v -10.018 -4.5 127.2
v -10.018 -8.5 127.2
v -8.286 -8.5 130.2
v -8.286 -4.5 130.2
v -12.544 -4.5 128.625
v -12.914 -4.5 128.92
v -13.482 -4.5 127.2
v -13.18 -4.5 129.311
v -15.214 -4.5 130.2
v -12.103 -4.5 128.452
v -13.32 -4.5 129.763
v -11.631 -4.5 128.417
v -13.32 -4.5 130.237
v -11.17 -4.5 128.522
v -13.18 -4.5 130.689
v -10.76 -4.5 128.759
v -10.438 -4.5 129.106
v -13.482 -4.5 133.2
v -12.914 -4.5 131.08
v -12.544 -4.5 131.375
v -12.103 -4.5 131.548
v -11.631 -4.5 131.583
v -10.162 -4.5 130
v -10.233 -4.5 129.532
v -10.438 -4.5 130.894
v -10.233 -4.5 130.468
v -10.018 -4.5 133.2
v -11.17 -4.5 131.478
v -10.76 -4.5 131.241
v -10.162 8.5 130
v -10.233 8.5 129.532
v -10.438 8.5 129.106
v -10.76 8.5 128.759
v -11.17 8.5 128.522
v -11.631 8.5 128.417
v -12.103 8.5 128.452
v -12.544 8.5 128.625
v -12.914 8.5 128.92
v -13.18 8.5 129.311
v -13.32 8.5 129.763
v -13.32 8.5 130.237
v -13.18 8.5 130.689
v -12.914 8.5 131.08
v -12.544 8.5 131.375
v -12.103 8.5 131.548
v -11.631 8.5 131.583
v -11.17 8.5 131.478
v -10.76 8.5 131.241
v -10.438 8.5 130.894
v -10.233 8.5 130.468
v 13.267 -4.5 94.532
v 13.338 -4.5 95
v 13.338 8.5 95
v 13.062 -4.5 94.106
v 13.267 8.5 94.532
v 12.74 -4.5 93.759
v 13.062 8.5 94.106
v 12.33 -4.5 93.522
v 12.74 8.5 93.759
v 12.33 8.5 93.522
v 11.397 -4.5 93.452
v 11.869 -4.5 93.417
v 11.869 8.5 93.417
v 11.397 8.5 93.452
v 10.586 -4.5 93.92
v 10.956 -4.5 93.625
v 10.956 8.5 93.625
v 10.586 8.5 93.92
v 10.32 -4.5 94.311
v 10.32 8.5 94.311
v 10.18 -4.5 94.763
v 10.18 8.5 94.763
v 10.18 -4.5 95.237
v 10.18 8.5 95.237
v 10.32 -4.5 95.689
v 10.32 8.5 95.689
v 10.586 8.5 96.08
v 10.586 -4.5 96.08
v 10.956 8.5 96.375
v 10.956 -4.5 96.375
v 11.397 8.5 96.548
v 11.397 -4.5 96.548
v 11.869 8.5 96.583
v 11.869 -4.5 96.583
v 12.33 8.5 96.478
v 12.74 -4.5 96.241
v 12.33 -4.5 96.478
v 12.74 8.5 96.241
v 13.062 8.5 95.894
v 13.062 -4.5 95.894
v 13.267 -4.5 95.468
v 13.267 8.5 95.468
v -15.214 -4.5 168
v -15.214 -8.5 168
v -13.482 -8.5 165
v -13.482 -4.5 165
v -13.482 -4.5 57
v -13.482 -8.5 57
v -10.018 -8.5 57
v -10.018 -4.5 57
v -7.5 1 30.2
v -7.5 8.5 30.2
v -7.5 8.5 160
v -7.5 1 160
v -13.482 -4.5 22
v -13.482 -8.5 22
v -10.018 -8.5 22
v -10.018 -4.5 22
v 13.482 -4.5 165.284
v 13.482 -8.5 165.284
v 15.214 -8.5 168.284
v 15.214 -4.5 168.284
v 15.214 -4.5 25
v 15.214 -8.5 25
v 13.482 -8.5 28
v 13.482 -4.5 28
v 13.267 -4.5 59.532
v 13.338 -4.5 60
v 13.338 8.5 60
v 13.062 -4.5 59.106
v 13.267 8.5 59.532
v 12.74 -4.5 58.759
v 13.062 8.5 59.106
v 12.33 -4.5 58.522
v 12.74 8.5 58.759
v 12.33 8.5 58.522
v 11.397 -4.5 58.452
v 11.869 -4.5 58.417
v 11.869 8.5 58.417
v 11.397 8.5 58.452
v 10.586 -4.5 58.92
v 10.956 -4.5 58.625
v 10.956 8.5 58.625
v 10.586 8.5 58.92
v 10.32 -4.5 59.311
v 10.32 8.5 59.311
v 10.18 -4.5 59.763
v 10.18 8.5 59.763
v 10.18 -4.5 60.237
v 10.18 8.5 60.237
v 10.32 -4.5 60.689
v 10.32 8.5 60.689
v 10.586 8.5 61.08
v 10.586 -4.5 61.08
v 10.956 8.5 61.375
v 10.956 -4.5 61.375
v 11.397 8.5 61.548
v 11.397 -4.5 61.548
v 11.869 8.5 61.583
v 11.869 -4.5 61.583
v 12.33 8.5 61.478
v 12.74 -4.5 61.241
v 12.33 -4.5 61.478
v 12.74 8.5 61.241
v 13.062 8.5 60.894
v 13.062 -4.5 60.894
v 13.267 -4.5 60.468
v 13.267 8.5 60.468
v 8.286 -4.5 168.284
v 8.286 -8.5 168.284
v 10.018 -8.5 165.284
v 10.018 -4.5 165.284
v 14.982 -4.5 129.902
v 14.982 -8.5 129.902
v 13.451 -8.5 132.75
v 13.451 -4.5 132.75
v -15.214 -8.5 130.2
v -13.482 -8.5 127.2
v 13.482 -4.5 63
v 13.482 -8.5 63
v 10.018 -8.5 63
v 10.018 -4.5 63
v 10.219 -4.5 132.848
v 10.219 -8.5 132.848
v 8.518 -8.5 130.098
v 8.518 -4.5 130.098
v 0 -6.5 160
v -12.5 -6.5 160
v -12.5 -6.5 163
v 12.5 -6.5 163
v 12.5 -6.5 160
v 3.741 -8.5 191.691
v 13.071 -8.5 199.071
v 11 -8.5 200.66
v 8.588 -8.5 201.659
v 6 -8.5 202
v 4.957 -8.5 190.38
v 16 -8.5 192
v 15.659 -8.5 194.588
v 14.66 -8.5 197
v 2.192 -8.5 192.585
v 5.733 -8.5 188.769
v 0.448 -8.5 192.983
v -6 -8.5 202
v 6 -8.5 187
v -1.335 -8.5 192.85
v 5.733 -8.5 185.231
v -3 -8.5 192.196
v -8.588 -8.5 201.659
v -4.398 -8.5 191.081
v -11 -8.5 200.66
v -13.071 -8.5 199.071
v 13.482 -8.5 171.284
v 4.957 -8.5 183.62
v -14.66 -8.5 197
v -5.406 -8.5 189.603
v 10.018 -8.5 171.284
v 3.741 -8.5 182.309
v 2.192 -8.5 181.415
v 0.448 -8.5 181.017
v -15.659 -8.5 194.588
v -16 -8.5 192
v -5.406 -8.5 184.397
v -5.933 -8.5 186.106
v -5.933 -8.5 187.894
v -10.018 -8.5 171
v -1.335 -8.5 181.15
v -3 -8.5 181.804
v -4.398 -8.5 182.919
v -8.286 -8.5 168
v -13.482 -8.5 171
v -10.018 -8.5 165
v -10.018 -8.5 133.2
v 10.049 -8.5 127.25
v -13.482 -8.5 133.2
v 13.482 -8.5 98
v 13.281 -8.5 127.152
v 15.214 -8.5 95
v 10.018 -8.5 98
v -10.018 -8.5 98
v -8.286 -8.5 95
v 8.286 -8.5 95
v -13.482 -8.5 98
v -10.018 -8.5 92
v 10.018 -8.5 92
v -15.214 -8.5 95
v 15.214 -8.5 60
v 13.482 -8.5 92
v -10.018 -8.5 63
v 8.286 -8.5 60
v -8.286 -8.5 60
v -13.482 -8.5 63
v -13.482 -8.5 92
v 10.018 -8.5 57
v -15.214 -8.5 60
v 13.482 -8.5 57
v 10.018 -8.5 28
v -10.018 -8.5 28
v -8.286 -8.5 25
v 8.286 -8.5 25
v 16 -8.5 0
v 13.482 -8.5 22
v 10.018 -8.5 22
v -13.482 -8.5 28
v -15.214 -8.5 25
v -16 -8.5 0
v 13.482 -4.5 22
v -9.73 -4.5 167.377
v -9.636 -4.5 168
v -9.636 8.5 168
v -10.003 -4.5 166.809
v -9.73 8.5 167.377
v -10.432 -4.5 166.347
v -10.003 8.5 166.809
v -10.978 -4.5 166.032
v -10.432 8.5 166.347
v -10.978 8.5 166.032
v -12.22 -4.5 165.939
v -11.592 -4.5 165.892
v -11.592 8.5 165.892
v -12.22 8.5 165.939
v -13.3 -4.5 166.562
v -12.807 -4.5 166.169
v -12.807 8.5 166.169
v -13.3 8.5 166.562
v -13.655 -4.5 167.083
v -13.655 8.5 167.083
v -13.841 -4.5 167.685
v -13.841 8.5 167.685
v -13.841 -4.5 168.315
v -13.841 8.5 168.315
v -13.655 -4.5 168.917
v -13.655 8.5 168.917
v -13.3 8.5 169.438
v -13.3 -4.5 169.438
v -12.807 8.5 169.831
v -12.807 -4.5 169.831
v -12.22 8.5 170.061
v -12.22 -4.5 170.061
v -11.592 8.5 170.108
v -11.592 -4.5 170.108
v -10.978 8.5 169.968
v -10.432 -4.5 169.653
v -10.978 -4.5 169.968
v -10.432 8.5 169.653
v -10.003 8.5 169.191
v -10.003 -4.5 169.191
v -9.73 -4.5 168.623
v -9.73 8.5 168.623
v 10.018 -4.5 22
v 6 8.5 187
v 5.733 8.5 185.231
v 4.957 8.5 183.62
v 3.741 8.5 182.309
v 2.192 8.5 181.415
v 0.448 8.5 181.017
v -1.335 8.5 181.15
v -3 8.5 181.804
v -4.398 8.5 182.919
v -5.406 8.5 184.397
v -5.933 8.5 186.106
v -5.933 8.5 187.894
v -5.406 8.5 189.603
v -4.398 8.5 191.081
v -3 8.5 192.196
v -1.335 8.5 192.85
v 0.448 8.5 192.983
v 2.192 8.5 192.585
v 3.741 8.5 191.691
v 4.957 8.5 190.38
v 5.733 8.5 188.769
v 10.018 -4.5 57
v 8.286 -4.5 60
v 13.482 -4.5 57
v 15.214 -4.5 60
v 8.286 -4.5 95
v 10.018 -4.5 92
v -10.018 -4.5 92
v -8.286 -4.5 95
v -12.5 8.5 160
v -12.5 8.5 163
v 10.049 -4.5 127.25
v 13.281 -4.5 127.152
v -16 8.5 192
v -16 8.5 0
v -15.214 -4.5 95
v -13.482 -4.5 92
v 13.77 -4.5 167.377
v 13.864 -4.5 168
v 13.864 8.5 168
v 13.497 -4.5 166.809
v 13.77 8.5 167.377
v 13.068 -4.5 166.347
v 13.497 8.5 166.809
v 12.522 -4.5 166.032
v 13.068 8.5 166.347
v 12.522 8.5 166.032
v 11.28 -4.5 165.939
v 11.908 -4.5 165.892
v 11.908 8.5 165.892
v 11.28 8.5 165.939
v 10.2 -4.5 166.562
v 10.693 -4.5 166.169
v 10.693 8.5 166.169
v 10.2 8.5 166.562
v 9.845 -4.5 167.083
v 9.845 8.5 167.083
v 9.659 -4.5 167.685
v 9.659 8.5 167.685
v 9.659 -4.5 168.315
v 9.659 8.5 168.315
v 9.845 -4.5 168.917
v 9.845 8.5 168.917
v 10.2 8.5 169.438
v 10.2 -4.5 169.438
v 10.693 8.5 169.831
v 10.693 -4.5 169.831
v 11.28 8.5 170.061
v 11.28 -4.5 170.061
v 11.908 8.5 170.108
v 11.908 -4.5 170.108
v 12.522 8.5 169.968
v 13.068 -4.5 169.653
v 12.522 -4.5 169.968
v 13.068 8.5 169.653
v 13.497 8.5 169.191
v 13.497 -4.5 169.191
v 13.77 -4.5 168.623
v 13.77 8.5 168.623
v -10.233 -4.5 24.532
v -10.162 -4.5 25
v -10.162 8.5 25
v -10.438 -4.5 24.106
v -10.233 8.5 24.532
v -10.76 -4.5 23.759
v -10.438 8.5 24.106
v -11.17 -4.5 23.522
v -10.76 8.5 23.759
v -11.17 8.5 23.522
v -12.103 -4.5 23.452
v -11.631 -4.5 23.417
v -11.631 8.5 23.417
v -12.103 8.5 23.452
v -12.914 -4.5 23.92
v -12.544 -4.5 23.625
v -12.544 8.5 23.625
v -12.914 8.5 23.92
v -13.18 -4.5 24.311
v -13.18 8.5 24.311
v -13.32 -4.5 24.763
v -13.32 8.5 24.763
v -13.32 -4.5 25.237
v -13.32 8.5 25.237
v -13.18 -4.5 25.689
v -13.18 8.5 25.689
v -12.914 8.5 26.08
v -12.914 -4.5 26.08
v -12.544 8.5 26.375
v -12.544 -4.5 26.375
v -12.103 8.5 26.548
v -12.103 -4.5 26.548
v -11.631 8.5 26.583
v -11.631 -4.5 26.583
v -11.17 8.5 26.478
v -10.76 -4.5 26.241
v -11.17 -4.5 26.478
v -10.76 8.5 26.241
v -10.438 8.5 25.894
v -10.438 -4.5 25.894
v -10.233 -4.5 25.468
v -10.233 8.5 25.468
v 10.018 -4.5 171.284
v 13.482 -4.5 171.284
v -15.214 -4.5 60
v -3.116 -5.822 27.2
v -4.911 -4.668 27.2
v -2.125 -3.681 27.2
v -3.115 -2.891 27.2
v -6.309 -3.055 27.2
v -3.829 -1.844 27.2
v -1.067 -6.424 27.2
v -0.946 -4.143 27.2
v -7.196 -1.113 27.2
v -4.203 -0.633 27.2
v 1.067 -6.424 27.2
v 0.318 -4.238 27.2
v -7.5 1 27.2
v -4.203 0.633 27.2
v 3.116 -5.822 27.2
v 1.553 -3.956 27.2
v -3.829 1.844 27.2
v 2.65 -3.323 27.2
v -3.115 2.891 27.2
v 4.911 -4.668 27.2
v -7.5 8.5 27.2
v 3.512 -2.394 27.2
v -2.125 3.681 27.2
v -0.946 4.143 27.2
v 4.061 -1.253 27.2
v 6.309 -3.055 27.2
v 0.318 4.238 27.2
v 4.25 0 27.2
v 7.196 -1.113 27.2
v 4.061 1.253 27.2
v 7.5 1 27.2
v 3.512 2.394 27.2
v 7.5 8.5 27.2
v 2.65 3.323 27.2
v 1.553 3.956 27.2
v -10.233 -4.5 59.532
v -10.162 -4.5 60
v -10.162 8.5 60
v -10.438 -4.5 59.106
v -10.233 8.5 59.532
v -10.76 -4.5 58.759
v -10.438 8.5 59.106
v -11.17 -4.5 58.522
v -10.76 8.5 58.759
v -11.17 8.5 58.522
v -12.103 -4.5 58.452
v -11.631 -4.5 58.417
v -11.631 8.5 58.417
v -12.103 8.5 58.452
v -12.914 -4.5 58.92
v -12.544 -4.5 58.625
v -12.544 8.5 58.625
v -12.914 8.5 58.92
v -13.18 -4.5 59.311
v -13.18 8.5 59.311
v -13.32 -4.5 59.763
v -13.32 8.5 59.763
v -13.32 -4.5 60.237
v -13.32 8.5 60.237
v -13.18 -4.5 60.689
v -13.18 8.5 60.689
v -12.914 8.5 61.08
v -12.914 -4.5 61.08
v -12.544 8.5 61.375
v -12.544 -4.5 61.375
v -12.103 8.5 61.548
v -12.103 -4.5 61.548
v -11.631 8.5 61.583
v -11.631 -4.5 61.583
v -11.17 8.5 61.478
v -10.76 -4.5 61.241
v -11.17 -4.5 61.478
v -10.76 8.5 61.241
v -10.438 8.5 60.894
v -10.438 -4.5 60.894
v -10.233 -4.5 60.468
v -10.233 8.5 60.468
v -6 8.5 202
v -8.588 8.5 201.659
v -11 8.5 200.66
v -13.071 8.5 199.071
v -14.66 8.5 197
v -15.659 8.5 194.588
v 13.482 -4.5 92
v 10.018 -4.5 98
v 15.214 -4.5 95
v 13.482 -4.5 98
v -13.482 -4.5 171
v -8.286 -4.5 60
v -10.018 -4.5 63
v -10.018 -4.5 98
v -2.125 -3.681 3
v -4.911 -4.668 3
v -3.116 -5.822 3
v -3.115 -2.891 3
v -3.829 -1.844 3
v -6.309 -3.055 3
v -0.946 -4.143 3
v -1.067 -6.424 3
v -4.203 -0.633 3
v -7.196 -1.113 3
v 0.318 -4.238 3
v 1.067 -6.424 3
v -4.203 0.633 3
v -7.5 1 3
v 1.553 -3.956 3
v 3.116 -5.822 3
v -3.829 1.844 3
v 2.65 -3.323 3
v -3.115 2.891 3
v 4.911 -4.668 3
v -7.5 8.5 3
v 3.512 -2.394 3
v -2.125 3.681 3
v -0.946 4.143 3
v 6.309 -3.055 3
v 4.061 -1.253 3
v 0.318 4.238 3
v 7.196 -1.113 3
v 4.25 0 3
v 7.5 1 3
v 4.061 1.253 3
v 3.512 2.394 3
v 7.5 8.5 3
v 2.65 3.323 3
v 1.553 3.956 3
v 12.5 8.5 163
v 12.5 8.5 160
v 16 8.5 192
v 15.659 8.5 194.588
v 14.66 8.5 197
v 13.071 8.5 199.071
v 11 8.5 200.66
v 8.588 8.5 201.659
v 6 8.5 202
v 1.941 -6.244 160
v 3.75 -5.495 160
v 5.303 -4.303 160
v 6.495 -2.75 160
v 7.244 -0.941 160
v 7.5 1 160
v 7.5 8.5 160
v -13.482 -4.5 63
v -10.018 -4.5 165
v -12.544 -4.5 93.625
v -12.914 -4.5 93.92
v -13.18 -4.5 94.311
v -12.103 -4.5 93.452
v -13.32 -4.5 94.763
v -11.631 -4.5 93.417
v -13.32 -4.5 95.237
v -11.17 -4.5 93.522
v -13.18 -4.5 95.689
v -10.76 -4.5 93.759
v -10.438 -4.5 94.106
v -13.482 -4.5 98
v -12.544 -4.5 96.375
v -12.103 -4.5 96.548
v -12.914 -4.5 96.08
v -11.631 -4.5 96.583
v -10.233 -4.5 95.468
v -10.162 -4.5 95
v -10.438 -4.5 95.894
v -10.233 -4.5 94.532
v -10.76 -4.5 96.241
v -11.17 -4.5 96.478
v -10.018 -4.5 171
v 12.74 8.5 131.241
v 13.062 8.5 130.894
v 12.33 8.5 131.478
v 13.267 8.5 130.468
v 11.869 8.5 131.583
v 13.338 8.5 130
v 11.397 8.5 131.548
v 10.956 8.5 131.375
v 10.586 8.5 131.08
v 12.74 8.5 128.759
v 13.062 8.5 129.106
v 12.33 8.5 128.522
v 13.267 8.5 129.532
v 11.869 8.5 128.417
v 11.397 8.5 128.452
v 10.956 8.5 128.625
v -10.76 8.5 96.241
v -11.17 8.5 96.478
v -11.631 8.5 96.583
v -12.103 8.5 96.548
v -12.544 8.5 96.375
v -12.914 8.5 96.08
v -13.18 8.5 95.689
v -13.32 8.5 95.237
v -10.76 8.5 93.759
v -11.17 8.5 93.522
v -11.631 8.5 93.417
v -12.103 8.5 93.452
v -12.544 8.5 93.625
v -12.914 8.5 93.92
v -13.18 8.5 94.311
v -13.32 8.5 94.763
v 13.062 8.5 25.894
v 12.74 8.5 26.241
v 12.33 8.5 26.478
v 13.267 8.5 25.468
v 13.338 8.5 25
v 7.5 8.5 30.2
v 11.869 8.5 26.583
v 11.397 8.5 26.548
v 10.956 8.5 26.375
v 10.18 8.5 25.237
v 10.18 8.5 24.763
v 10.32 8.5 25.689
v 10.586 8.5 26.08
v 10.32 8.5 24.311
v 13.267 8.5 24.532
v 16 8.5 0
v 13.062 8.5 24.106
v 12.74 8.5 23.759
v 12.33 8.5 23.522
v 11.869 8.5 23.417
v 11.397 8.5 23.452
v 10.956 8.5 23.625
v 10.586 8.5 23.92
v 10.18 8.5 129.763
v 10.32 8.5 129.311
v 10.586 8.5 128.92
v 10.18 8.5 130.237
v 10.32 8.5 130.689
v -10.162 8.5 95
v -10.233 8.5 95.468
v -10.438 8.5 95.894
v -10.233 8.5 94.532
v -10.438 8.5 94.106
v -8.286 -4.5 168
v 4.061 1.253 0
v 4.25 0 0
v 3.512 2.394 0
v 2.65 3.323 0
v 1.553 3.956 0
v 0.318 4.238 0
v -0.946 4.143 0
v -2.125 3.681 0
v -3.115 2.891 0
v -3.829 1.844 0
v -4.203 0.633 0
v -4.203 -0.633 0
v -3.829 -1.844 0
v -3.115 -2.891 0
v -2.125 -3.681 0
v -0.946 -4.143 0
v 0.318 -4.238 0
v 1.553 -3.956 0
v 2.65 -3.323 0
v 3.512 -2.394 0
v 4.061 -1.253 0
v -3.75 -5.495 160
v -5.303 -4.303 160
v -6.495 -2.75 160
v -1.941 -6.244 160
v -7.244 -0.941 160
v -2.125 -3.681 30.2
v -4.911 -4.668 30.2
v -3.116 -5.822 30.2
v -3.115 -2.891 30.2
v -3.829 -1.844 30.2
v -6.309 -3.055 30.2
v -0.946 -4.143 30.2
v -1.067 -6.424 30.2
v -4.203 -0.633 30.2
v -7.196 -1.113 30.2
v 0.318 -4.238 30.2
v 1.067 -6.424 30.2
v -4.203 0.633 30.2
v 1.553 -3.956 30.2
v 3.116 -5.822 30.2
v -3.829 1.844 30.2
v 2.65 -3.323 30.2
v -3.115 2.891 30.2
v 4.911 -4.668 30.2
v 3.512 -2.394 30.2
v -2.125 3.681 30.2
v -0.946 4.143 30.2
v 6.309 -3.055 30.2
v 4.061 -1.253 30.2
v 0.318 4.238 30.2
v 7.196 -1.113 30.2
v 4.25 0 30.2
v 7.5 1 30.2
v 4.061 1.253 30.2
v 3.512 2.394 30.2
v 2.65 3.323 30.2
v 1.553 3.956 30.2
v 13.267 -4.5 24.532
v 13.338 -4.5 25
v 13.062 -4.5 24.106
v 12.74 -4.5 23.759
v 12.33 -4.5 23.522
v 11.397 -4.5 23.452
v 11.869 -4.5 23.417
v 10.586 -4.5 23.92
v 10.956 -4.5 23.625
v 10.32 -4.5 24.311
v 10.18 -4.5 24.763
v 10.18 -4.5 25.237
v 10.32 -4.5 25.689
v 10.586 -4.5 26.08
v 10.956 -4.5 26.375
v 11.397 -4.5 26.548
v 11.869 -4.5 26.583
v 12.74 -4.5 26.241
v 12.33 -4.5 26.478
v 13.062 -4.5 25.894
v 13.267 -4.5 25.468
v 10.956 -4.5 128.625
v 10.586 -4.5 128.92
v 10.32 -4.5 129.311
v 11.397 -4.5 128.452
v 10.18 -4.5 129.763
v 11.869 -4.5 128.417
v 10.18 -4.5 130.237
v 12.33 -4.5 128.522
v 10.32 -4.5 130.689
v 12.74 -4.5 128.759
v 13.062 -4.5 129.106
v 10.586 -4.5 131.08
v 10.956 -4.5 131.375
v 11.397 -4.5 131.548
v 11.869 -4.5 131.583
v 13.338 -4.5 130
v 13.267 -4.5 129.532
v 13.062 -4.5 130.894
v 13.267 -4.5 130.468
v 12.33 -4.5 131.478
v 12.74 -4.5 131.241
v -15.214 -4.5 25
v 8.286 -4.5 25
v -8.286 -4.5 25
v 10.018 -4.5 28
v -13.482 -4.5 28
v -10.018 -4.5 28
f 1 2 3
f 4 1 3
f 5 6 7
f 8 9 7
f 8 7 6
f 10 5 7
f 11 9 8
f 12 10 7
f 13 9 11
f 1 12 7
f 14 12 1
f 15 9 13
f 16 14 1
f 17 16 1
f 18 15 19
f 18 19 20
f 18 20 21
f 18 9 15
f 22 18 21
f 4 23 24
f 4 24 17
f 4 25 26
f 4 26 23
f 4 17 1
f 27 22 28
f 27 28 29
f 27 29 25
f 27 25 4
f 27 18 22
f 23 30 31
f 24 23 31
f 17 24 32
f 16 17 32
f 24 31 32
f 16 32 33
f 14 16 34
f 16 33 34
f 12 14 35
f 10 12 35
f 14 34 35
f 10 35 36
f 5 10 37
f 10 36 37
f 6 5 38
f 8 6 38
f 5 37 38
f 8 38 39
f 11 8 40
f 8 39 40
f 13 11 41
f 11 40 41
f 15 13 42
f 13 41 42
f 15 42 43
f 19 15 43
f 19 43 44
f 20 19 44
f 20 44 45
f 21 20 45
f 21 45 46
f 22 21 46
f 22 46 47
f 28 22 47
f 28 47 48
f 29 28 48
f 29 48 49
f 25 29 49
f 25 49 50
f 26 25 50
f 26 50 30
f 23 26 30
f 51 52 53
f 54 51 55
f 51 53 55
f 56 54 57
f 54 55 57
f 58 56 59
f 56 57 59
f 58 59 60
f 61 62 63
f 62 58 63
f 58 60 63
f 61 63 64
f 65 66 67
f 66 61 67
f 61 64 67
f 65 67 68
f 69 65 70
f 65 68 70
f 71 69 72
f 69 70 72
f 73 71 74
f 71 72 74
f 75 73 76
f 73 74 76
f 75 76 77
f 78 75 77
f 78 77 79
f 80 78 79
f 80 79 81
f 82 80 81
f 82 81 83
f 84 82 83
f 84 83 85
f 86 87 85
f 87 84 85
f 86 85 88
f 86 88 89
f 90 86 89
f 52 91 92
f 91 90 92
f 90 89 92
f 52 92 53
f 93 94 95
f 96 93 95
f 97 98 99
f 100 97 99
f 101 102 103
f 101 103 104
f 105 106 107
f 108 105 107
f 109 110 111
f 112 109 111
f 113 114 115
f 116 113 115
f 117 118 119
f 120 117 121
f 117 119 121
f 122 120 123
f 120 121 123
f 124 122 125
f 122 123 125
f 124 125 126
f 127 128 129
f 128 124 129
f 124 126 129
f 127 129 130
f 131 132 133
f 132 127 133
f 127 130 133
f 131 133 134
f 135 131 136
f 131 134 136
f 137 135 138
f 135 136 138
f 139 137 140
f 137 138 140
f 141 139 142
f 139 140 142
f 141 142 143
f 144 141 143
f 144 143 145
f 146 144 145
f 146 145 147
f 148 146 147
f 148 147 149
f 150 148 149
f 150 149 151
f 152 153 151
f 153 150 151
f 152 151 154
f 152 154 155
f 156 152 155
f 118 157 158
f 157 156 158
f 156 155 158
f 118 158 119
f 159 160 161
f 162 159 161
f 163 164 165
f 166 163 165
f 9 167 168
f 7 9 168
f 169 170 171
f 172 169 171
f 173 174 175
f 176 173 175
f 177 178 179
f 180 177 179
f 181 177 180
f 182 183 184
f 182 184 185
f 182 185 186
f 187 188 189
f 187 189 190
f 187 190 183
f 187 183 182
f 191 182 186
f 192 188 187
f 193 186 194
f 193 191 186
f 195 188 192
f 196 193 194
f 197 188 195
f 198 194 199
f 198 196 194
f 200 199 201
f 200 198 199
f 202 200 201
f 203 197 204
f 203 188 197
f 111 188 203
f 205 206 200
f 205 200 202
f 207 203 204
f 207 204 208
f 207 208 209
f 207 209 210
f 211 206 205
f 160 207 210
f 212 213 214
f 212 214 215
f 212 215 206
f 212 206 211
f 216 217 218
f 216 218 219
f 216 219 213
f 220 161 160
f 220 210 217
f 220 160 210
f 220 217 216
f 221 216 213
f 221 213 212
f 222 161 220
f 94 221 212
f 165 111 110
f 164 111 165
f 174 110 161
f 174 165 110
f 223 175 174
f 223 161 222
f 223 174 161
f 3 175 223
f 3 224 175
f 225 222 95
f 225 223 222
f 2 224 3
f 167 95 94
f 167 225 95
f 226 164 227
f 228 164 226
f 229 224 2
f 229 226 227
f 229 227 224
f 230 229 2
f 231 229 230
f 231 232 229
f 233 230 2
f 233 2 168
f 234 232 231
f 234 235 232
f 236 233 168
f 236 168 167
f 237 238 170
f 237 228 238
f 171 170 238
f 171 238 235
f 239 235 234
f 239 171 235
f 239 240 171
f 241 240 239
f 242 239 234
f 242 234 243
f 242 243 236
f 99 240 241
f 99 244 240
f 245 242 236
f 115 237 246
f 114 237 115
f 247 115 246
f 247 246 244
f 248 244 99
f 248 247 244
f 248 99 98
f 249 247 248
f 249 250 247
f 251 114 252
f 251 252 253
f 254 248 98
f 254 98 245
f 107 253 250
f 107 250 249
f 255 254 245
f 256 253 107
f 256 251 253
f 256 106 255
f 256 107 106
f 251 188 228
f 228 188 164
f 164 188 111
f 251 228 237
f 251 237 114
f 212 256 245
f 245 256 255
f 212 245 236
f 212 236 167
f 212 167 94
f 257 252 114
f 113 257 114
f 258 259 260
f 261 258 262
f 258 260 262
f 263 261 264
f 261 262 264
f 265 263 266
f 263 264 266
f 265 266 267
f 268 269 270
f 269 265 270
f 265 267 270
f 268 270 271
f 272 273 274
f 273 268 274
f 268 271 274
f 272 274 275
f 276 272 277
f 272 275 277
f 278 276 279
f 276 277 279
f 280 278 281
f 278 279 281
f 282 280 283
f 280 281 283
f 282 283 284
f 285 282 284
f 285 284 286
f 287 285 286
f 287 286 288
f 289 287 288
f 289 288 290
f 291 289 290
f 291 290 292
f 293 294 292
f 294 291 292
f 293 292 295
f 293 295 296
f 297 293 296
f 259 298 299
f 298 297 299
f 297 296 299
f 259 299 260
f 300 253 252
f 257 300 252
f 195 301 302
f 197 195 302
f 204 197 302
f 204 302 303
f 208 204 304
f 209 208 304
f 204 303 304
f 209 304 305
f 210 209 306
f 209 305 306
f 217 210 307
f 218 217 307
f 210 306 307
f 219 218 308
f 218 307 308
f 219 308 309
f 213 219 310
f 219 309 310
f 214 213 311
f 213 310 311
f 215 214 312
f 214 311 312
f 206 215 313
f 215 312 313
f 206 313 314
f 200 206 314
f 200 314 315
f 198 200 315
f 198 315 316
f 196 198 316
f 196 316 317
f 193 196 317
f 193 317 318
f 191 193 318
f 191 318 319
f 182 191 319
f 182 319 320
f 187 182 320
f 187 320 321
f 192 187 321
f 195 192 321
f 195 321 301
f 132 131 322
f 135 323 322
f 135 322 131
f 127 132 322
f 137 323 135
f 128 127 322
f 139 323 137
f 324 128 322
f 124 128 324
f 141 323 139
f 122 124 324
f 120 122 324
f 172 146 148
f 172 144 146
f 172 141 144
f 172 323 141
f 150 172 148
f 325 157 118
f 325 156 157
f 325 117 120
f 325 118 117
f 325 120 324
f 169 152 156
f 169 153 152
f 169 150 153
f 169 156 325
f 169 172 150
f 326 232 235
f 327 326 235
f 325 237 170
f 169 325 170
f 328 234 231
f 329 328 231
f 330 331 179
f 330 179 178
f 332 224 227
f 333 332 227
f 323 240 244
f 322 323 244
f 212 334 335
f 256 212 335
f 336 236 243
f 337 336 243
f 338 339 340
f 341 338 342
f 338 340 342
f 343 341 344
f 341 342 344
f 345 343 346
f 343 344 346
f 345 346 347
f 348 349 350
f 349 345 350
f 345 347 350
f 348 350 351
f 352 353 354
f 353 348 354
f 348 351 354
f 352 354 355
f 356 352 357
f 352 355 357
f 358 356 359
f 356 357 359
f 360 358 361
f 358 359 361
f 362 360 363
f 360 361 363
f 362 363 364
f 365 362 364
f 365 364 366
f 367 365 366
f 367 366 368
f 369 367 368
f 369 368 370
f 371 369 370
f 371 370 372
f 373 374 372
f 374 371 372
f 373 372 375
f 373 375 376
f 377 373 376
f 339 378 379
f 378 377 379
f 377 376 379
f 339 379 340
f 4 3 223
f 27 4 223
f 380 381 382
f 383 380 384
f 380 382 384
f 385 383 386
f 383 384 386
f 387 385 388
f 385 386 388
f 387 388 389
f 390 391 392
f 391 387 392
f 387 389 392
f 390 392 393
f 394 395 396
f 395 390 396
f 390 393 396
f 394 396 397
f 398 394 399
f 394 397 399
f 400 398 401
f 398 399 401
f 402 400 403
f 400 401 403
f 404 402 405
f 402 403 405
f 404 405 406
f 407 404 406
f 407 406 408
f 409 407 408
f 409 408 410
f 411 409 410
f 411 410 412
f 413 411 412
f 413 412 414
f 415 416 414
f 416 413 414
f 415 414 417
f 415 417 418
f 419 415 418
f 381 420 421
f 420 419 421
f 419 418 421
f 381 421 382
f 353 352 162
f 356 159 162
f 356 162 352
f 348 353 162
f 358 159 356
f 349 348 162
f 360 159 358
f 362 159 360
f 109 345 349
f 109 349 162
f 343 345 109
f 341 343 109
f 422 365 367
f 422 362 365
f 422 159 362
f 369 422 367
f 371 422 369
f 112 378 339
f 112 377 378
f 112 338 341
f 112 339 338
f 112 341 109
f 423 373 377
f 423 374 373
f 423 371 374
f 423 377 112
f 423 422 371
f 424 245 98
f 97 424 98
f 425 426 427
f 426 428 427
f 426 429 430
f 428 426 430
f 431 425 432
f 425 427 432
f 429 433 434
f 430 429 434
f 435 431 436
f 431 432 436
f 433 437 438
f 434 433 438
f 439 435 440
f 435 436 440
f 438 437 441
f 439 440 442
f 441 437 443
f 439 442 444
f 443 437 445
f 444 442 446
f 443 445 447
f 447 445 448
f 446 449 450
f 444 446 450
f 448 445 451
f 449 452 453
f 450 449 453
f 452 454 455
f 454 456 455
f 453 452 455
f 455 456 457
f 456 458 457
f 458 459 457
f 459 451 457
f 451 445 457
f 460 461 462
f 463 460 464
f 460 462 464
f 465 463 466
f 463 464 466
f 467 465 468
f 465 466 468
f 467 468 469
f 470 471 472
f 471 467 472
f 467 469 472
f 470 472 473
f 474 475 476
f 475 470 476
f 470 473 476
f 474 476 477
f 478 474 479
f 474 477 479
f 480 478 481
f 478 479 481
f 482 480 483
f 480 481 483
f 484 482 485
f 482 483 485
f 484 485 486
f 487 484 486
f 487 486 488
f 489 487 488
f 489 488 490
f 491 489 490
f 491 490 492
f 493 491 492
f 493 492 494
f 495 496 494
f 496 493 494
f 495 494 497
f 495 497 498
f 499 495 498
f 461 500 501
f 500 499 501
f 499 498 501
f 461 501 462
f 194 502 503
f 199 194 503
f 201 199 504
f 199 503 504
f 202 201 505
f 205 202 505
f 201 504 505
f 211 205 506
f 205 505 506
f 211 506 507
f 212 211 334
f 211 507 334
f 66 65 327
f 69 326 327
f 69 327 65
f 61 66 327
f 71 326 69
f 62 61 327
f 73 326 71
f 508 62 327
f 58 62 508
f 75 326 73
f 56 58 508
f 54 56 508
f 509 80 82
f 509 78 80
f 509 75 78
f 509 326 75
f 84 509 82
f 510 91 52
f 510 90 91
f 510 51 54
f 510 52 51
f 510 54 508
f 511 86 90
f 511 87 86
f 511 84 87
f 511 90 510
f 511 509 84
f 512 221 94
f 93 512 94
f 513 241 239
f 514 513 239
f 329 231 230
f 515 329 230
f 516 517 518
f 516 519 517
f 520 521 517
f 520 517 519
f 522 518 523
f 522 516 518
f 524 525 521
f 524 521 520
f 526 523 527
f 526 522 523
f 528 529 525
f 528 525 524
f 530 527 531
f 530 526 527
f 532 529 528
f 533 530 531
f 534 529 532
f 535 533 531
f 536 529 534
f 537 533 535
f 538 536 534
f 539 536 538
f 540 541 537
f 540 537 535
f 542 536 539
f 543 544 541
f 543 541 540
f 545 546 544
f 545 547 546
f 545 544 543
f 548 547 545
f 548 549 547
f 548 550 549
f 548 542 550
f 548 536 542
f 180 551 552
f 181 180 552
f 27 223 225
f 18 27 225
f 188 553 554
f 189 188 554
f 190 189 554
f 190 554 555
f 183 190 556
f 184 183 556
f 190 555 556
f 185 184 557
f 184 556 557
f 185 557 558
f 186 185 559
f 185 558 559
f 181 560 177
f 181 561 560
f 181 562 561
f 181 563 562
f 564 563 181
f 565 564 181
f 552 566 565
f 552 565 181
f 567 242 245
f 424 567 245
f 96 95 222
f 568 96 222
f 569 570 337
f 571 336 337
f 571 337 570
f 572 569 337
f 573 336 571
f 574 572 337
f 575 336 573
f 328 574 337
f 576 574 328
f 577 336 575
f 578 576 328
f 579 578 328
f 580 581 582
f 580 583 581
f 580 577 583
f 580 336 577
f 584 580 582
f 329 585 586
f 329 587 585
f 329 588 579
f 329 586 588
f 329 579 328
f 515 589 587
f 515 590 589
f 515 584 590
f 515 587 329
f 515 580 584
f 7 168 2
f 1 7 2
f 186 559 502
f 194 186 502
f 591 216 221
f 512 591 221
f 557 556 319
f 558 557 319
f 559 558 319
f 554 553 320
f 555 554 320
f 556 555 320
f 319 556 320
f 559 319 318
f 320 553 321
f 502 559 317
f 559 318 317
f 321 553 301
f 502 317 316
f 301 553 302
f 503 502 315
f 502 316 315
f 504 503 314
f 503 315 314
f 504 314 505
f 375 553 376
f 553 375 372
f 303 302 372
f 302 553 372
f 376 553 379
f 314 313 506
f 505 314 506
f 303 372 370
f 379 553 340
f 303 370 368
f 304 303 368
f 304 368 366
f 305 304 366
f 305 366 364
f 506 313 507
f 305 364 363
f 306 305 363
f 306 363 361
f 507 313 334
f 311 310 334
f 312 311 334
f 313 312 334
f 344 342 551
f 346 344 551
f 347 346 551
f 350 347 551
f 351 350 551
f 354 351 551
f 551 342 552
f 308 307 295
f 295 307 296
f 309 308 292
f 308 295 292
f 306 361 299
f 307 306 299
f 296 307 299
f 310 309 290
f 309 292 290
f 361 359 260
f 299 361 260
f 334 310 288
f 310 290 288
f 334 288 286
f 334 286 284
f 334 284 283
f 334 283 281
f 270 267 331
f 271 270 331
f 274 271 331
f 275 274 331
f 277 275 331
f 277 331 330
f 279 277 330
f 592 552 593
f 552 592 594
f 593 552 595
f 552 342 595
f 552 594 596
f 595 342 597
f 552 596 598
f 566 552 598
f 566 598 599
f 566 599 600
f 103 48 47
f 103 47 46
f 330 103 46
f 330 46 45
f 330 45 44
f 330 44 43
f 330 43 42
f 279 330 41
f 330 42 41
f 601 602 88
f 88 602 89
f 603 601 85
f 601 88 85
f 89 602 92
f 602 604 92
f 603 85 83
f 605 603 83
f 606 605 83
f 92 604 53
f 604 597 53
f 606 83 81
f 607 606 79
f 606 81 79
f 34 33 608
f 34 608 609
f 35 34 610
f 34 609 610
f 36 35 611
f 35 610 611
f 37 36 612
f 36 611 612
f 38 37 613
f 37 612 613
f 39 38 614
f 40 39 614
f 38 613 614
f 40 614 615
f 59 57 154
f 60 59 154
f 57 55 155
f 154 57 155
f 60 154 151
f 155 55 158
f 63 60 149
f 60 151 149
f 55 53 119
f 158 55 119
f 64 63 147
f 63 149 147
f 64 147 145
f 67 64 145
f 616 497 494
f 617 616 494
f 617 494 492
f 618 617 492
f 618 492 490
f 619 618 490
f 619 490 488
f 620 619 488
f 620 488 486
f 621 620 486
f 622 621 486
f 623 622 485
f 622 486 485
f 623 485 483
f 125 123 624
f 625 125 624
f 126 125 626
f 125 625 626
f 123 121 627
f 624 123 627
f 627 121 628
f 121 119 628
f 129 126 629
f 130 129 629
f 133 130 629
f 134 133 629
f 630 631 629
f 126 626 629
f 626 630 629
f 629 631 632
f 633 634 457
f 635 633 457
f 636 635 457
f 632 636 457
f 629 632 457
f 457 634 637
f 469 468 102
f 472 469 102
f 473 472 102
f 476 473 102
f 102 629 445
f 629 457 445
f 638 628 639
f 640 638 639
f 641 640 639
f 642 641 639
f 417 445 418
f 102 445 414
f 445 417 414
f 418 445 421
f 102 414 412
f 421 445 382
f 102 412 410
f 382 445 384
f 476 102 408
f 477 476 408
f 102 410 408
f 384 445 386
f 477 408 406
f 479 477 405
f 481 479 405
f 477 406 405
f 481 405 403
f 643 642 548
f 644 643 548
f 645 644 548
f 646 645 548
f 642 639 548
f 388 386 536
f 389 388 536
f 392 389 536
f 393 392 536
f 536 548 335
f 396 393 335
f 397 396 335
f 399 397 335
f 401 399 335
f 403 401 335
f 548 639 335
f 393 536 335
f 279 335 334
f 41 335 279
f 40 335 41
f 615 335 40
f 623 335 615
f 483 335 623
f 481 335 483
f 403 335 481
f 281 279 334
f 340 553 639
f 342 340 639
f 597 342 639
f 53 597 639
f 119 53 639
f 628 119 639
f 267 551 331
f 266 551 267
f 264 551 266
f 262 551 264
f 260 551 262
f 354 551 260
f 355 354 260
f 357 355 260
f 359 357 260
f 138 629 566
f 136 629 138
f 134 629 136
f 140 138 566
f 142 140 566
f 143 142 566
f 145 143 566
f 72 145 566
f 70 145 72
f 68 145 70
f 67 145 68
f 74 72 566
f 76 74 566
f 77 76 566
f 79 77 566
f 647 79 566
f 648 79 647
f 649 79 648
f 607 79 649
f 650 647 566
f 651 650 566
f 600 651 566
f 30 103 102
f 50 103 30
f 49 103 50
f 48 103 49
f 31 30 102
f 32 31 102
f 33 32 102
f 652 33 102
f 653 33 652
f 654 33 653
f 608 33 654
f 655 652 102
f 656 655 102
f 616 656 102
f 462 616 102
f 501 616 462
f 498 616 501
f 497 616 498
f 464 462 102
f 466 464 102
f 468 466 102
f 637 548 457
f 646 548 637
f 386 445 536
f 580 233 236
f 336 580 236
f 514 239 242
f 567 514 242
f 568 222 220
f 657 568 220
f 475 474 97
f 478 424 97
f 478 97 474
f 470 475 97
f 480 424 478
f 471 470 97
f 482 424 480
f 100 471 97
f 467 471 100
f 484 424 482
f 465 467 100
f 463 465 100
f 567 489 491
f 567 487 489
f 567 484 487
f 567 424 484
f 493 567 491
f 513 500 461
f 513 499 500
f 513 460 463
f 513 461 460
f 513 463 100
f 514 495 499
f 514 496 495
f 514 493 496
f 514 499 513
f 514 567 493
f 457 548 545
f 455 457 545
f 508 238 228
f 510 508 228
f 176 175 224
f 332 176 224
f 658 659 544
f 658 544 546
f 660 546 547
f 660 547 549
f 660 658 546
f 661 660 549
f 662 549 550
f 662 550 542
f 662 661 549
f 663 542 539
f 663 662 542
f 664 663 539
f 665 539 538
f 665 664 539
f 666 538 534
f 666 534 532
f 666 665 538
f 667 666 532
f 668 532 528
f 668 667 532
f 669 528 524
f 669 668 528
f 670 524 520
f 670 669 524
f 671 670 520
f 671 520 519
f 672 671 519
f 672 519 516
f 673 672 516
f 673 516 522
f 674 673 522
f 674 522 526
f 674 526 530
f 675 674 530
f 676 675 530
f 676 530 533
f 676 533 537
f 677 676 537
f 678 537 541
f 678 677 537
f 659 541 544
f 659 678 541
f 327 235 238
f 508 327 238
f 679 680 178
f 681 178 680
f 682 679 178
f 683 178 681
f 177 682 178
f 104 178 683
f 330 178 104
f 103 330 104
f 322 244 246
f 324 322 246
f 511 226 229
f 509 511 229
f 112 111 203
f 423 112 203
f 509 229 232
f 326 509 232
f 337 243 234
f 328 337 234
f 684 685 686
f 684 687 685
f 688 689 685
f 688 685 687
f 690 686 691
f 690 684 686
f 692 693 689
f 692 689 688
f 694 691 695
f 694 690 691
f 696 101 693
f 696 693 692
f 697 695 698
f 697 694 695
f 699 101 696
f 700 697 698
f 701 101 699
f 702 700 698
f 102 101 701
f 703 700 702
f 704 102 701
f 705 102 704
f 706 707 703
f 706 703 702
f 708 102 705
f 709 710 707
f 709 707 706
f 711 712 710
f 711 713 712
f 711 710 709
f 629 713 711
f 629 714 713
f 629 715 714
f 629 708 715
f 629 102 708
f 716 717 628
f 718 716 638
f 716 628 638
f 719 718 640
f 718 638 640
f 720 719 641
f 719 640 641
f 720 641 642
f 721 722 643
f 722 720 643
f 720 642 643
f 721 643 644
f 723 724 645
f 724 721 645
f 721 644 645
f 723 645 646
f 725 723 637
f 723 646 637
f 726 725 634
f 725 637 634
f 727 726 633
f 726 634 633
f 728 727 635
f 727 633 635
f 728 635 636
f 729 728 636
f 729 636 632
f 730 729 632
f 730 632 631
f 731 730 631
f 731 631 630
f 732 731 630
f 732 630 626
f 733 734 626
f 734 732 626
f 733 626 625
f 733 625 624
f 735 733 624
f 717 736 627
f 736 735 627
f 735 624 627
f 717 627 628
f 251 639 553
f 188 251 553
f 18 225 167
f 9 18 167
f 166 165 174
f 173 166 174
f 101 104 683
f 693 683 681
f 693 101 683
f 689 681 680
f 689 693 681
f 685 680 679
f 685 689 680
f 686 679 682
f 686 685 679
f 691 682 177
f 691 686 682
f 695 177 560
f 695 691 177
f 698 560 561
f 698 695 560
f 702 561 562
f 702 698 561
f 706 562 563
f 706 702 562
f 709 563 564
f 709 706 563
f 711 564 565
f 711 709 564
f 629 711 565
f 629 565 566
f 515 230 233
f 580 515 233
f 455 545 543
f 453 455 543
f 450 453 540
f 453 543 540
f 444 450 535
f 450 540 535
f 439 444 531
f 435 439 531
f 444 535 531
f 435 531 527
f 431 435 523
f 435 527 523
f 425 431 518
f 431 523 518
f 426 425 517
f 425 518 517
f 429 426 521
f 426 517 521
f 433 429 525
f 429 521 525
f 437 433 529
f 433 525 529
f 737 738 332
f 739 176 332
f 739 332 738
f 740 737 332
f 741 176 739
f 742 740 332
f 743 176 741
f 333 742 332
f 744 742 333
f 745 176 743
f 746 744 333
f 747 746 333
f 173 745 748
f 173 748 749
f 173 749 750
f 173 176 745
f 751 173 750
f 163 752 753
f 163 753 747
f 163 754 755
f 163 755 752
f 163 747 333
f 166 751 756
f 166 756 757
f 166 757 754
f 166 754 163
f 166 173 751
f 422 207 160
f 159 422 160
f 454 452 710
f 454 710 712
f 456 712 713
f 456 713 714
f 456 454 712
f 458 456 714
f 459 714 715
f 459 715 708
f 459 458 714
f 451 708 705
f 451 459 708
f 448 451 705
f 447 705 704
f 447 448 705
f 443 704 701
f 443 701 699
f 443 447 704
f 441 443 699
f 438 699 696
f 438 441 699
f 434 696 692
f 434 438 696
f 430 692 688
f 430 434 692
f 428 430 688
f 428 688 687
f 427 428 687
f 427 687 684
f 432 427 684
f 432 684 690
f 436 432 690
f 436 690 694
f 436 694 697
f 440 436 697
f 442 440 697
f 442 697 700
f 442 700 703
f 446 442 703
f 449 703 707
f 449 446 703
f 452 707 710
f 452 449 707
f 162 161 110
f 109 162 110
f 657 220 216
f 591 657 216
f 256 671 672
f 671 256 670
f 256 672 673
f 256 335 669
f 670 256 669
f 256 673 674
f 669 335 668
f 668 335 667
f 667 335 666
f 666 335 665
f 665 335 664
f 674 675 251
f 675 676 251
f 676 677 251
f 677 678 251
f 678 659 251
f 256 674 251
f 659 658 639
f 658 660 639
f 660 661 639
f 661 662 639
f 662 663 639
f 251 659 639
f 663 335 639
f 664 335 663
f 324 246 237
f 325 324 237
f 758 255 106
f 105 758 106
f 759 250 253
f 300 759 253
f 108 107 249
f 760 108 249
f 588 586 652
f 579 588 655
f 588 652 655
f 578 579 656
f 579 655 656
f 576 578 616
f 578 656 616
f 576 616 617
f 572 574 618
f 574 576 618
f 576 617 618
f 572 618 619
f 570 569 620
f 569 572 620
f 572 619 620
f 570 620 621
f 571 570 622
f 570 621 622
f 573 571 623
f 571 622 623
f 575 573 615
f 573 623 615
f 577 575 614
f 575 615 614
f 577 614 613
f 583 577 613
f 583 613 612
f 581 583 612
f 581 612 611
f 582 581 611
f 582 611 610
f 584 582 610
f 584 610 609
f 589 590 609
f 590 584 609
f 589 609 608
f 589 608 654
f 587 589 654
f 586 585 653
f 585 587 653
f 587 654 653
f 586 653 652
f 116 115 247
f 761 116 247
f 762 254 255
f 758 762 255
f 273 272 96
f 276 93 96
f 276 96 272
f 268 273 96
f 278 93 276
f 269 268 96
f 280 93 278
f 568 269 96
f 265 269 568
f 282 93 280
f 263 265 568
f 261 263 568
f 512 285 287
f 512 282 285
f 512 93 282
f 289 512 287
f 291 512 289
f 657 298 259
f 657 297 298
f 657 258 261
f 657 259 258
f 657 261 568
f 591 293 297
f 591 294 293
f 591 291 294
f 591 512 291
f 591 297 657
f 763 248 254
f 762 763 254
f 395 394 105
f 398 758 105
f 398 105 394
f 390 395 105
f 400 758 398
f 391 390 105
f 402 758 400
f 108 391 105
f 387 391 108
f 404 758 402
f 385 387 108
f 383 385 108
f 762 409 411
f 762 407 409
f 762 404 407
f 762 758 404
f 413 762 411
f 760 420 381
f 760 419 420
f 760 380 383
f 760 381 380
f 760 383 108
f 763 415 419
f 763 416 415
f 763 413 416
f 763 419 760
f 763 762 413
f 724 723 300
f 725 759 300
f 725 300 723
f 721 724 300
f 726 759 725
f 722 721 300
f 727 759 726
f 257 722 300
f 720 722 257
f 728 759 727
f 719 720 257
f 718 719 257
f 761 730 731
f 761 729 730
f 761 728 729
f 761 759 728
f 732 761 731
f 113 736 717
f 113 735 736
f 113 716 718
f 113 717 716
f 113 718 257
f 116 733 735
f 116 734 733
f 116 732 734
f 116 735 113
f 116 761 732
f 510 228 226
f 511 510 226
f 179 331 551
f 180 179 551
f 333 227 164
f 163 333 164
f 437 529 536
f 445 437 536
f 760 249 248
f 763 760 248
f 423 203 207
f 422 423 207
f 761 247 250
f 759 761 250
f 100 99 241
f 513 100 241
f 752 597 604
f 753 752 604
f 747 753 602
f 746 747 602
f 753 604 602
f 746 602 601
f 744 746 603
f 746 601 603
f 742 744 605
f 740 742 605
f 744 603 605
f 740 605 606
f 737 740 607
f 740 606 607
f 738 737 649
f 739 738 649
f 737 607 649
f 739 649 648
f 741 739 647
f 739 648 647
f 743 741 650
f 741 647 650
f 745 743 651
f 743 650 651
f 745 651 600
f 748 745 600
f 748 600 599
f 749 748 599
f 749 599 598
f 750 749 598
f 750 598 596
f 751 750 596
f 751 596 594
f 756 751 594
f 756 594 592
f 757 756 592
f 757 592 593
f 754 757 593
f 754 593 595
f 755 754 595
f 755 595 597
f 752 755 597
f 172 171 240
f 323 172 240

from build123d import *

# Parameters (mm, degrees)
SKETCH1_W           = 32
SKETCH1_H           = 17
SKETCH1_R           = 4.25
BOSS_EXTRUDE1_DEPTH = 3
BOSS_EXTRUDE2_DEPTH = 24.2
SKETCH3_W           = 32
SKETCH3_H           = 17
SKETCH3_R           = 4.25
BOSS_EXTRUDE3_DEPTH = 3
BOSS_EXTRUDE4_DEPTH = 129.8
SKETCH5_W           = 32
SKETCH5_H           = 17
BOSS_EXTRUDE5_DEPTH = 18
SKETCH6_W           = 25
SKETCH6_H           = 3
CUT_EXTRUDE1_DEPTH  = 15
BOSS_EXTRUDE6_DEPTH = 17
SKETCH8_R           = 6
CUT_EXTRUDE2_DEPTH  = 46
SKETCH9_R           = 1.5875
SKETCH9_R_2         = 2.114349704
CUT_EXTRUDE3_DEPTH  = 46
SKETCH10_R          = 1.5875
SKETCH10_R_2        = 2.114349704
CUT_EXTRUDE4_DEPTH  = 4


with BuildPart() as part:
    # Sketch1 → Boss-Extrude1 (new body)
    with BuildSketch(Plane.XY):
        Rectangle(SKETCH1_W, SKETCH1_H)
        Circle(SKETCH1_R, mode=Mode.SUBTRACT)
    extrude(amount=BOSS_EXTRUDE1_DEPTH)

    # Sketch2 → Boss-Extrude2 (add)
    with BuildSketch(Plane.XY.offset(3)):
        with BuildLine():
            Line((-7.5, 1), (-7.5, 8.5))
            Line((-7.5, 8.5), (-16, 8.5))
            Line((-16, 8.5), (-16, -8.5))
            Line((-16, -8.5), (16, -8.5))
            Line((16, -8.5), (16, 8.5))
            Line((16, 8.5), (7.5, 8.5))
            Line((7.5, 8.5), (7.5, 1))
            ThreePointArc((7.5, 1), (0, -6.5), (-7.5, 1))
        make_face()
    extrude(amount=BOSS_EXTRUDE2_DEPTH)

    # Sketch3 → Boss-Extrude3 (add)
    with BuildSketch(Plane.XY.offset(27.2)):
        Rectangle(SKETCH3_W, SKETCH3_H)
        Circle(SKETCH3_R, mode=Mode.SUBTRACT)
    extrude(amount=BOSS_EXTRUDE3_DEPTH)

    # Sketch4 → Boss-Extrude4 (add)
    with BuildSketch(Plane.XY.offset(30.2)):
        with BuildLine():
            Line((16, -8.5), (-16, -8.5))
            Line((-16, -8.5), (-16, 8.5))
            Line((-16, 8.5), (-7.5, 8.5))
            Line((-7.5, 8.5), (-7.5, 1))
            ThreePointArc((-7.5, 1), (0, -6.5), (7.5, 1))
            Line((7.5, 1), (7.5, 8.5))
            Line((7.5, 8.5), (16, 8.5))
            Line((16, 8.5), (16, -8.5))
        make_face()
    extrude(amount=BOSS_EXTRUDE4_DEPTH)

    # Sketch5 → Boss-Extrude5 (add)
    with BuildSketch(Plane.XY.offset(160)):
        Rectangle(SKETCH5_W, SKETCH5_H)
    extrude(amount=BOSS_EXTRUDE5_DEPTH)

    # Sketch6 → Cut-Extrude1 (cut)
    with BuildSketch(Plane(origin=(0, 8.5, 0), x_dir=(1, 0, 0), z_dir=(0, 1, 0))):
        with Locations((0, -161.5)):
            Rectangle(SKETCH6_W, SKETCH6_H)
    extrude(amount=-CUT_EXTRUDE1_DEPTH, mode=Mode.SUBTRACT)

    # Sketch7 → Boss-Extrude6 (add)
    with BuildSketch(Plane(origin=(0, 8.5, 0), x_dir=(1, 0, 0), z_dir=(0, 1, 0))):
        with BuildLine():
            Line((-16, -178), (16, -178))
            Line((16, -178), (16, -192))
            ThreePointArc((16, -192), (13.071067812, -199.071067812), (6, -202))
            Line((6, -202), (-6, -202))
            ThreePointArc((-6, -202), (-13.071067812, -199.071067812), (-16, -192))
            Line((-16, -192), (-16, -178))
        make_face()
    extrude(amount=-BOSS_EXTRUDE6_DEPTH)

    # Sketch8 → Cut-Extrude2 (cut)
    with BuildSketch(Plane(origin=(0, 8.5, 0), x_dir=(1, 0, 0), z_dir=(0, 1, 0))):
        with Locations((0, -187)):
            Circle(SKETCH8_R)
    extrude(amount=-CUT_EXTRUDE2_DEPTH, mode=Mode.SUBTRACT)

    # Sketch9 → Cut-Extrude3 (cut)
    with BuildSketch(Plane(origin=(0, 8.5, 0), x_dir=(1, 0, 0), z_dir=(0, 1, 0))):
        with Locations((11.75, -130)):
            Circle(SKETCH9_R)
        with Locations((-11.75, -130)):
            Circle(SKETCH9_R)
        with Locations((11.75, -95)):
            Circle(SKETCH9_R)
        with Locations((-11.75, -95)):
            Circle(SKETCH9_R)
        with Locations((11.75, -60)):
            Circle(SKETCH9_R)
        with Locations((11.75, -25)):
            Circle(SKETCH9_R)
        with Locations((-11.75, -25)):
            Circle(SKETCH9_R)
        with Locations((-11.75, -60)):
            Circle(SKETCH9_R)
        with Locations((11.75, -168)):
            Circle(SKETCH9_R_2)
        with Locations((-11.75, -168)):
            Circle(SKETCH9_R_2)
    extrude(amount=-CUT_EXTRUDE3_DEPTH, mode=Mode.SUBTRACT)

    # Sketch10 → Cut-Extrude4 (cut)
    with BuildSketch(Plane.XZ.offset(8.5)):
        Polygon((-15.214, 25), (-13.482, 22), (-10.018, 22), (-8.286, 25), (-10.018, 28), (-13.482, 28), align=None)
        with Locations((-11.75, 25)):
            Circle(SKETCH10_R, mode=Mode.SUBTRACT)
        Polygon((13.482, 28), (10.018, 28), (8.286, 25), (10.018, 22), (13.482, 22), (15.214, 25), align=None)
        with Locations((11.75, 25)):
            Circle(SKETCH10_R, mode=Mode.SUBTRACT)
        Polygon((13.482, 171.283743046), (10.018, 171.283743046), (8.286, 168.283743046), (10.018, 165.283743046), (13.482, 165.283743046), (15.214, 168.283743046), align=None)
        with Locations((11.75, 168)):
            Circle(SKETCH10_R_2, mode=Mode.SUBTRACT)
        Polygon((-10.017949192, 57), (-8.285898385, 60), (-10.017949192, 63), (-13.482050808, 63), (-15.214101615, 60), (-13.482050808, 57), align=None)
        with Locations((-11.75, 60)):
            Circle(SKETCH10_R, mode=Mode.SUBTRACT)
        Polygon((13.482050808, 57), (15.214101615, 60), (13.482050808, 63), (10.017949192, 63), (8.285898385, 60), (10.017949192, 57), align=None)
        with Locations((11.75, 60)):
            Circle(SKETCH10_R, mode=Mode.SUBTRACT)
        Polygon((13.482050808, 92), (15.214101615, 95), (13.482050808, 98), (10.017949192, 98), (8.285898385, 95), (10.017949192, 92), align=None)
        with Locations((11.75, 95)):
            Circle(SKETCH10_R, mode=Mode.SUBTRACT)
        Polygon((-10.017949192, 92), (-8.285898385, 95), (-10.017949192, 98), (-13.482050808, 98), (-15.214101615, 95), (-13.482050808, 92), align=None)
        with Locations((-11.75, 95)):
            Circle(SKETCH10_R, mode=Mode.SUBTRACT)
        Polygon((-10.017949192, 127.2), (-8.285898385, 130.2), (-10.017949192, 133.2), (-13.482050808, 133.2), (-15.214101615, 130.2), (-13.482050808, 127.2), align=None)
        Polygon((-10.017949192, 165), (-8.285898385, 168), (-10.017949192, 171), (-13.482050808, 171), (-15.214101615, 168), (-13.482050808, 165), align=None)
        with Locations((-11.75, 168)):
            Circle(SKETCH10_R_2, mode=Mode.SUBTRACT)
        Polygon((10.04912113, 127.250391955), (13.280790983, 127.152191667), (14.981669853, 129.901799713), (13.45087887, 132.749608045), (10.219209017, 132.847808333), (8.518330147, 130.098200287), align=None)
    extrude(amount=-CUT_EXTRUDE4_DEPTH, mode=Mode.SUBTRACT)


solid = part.part
